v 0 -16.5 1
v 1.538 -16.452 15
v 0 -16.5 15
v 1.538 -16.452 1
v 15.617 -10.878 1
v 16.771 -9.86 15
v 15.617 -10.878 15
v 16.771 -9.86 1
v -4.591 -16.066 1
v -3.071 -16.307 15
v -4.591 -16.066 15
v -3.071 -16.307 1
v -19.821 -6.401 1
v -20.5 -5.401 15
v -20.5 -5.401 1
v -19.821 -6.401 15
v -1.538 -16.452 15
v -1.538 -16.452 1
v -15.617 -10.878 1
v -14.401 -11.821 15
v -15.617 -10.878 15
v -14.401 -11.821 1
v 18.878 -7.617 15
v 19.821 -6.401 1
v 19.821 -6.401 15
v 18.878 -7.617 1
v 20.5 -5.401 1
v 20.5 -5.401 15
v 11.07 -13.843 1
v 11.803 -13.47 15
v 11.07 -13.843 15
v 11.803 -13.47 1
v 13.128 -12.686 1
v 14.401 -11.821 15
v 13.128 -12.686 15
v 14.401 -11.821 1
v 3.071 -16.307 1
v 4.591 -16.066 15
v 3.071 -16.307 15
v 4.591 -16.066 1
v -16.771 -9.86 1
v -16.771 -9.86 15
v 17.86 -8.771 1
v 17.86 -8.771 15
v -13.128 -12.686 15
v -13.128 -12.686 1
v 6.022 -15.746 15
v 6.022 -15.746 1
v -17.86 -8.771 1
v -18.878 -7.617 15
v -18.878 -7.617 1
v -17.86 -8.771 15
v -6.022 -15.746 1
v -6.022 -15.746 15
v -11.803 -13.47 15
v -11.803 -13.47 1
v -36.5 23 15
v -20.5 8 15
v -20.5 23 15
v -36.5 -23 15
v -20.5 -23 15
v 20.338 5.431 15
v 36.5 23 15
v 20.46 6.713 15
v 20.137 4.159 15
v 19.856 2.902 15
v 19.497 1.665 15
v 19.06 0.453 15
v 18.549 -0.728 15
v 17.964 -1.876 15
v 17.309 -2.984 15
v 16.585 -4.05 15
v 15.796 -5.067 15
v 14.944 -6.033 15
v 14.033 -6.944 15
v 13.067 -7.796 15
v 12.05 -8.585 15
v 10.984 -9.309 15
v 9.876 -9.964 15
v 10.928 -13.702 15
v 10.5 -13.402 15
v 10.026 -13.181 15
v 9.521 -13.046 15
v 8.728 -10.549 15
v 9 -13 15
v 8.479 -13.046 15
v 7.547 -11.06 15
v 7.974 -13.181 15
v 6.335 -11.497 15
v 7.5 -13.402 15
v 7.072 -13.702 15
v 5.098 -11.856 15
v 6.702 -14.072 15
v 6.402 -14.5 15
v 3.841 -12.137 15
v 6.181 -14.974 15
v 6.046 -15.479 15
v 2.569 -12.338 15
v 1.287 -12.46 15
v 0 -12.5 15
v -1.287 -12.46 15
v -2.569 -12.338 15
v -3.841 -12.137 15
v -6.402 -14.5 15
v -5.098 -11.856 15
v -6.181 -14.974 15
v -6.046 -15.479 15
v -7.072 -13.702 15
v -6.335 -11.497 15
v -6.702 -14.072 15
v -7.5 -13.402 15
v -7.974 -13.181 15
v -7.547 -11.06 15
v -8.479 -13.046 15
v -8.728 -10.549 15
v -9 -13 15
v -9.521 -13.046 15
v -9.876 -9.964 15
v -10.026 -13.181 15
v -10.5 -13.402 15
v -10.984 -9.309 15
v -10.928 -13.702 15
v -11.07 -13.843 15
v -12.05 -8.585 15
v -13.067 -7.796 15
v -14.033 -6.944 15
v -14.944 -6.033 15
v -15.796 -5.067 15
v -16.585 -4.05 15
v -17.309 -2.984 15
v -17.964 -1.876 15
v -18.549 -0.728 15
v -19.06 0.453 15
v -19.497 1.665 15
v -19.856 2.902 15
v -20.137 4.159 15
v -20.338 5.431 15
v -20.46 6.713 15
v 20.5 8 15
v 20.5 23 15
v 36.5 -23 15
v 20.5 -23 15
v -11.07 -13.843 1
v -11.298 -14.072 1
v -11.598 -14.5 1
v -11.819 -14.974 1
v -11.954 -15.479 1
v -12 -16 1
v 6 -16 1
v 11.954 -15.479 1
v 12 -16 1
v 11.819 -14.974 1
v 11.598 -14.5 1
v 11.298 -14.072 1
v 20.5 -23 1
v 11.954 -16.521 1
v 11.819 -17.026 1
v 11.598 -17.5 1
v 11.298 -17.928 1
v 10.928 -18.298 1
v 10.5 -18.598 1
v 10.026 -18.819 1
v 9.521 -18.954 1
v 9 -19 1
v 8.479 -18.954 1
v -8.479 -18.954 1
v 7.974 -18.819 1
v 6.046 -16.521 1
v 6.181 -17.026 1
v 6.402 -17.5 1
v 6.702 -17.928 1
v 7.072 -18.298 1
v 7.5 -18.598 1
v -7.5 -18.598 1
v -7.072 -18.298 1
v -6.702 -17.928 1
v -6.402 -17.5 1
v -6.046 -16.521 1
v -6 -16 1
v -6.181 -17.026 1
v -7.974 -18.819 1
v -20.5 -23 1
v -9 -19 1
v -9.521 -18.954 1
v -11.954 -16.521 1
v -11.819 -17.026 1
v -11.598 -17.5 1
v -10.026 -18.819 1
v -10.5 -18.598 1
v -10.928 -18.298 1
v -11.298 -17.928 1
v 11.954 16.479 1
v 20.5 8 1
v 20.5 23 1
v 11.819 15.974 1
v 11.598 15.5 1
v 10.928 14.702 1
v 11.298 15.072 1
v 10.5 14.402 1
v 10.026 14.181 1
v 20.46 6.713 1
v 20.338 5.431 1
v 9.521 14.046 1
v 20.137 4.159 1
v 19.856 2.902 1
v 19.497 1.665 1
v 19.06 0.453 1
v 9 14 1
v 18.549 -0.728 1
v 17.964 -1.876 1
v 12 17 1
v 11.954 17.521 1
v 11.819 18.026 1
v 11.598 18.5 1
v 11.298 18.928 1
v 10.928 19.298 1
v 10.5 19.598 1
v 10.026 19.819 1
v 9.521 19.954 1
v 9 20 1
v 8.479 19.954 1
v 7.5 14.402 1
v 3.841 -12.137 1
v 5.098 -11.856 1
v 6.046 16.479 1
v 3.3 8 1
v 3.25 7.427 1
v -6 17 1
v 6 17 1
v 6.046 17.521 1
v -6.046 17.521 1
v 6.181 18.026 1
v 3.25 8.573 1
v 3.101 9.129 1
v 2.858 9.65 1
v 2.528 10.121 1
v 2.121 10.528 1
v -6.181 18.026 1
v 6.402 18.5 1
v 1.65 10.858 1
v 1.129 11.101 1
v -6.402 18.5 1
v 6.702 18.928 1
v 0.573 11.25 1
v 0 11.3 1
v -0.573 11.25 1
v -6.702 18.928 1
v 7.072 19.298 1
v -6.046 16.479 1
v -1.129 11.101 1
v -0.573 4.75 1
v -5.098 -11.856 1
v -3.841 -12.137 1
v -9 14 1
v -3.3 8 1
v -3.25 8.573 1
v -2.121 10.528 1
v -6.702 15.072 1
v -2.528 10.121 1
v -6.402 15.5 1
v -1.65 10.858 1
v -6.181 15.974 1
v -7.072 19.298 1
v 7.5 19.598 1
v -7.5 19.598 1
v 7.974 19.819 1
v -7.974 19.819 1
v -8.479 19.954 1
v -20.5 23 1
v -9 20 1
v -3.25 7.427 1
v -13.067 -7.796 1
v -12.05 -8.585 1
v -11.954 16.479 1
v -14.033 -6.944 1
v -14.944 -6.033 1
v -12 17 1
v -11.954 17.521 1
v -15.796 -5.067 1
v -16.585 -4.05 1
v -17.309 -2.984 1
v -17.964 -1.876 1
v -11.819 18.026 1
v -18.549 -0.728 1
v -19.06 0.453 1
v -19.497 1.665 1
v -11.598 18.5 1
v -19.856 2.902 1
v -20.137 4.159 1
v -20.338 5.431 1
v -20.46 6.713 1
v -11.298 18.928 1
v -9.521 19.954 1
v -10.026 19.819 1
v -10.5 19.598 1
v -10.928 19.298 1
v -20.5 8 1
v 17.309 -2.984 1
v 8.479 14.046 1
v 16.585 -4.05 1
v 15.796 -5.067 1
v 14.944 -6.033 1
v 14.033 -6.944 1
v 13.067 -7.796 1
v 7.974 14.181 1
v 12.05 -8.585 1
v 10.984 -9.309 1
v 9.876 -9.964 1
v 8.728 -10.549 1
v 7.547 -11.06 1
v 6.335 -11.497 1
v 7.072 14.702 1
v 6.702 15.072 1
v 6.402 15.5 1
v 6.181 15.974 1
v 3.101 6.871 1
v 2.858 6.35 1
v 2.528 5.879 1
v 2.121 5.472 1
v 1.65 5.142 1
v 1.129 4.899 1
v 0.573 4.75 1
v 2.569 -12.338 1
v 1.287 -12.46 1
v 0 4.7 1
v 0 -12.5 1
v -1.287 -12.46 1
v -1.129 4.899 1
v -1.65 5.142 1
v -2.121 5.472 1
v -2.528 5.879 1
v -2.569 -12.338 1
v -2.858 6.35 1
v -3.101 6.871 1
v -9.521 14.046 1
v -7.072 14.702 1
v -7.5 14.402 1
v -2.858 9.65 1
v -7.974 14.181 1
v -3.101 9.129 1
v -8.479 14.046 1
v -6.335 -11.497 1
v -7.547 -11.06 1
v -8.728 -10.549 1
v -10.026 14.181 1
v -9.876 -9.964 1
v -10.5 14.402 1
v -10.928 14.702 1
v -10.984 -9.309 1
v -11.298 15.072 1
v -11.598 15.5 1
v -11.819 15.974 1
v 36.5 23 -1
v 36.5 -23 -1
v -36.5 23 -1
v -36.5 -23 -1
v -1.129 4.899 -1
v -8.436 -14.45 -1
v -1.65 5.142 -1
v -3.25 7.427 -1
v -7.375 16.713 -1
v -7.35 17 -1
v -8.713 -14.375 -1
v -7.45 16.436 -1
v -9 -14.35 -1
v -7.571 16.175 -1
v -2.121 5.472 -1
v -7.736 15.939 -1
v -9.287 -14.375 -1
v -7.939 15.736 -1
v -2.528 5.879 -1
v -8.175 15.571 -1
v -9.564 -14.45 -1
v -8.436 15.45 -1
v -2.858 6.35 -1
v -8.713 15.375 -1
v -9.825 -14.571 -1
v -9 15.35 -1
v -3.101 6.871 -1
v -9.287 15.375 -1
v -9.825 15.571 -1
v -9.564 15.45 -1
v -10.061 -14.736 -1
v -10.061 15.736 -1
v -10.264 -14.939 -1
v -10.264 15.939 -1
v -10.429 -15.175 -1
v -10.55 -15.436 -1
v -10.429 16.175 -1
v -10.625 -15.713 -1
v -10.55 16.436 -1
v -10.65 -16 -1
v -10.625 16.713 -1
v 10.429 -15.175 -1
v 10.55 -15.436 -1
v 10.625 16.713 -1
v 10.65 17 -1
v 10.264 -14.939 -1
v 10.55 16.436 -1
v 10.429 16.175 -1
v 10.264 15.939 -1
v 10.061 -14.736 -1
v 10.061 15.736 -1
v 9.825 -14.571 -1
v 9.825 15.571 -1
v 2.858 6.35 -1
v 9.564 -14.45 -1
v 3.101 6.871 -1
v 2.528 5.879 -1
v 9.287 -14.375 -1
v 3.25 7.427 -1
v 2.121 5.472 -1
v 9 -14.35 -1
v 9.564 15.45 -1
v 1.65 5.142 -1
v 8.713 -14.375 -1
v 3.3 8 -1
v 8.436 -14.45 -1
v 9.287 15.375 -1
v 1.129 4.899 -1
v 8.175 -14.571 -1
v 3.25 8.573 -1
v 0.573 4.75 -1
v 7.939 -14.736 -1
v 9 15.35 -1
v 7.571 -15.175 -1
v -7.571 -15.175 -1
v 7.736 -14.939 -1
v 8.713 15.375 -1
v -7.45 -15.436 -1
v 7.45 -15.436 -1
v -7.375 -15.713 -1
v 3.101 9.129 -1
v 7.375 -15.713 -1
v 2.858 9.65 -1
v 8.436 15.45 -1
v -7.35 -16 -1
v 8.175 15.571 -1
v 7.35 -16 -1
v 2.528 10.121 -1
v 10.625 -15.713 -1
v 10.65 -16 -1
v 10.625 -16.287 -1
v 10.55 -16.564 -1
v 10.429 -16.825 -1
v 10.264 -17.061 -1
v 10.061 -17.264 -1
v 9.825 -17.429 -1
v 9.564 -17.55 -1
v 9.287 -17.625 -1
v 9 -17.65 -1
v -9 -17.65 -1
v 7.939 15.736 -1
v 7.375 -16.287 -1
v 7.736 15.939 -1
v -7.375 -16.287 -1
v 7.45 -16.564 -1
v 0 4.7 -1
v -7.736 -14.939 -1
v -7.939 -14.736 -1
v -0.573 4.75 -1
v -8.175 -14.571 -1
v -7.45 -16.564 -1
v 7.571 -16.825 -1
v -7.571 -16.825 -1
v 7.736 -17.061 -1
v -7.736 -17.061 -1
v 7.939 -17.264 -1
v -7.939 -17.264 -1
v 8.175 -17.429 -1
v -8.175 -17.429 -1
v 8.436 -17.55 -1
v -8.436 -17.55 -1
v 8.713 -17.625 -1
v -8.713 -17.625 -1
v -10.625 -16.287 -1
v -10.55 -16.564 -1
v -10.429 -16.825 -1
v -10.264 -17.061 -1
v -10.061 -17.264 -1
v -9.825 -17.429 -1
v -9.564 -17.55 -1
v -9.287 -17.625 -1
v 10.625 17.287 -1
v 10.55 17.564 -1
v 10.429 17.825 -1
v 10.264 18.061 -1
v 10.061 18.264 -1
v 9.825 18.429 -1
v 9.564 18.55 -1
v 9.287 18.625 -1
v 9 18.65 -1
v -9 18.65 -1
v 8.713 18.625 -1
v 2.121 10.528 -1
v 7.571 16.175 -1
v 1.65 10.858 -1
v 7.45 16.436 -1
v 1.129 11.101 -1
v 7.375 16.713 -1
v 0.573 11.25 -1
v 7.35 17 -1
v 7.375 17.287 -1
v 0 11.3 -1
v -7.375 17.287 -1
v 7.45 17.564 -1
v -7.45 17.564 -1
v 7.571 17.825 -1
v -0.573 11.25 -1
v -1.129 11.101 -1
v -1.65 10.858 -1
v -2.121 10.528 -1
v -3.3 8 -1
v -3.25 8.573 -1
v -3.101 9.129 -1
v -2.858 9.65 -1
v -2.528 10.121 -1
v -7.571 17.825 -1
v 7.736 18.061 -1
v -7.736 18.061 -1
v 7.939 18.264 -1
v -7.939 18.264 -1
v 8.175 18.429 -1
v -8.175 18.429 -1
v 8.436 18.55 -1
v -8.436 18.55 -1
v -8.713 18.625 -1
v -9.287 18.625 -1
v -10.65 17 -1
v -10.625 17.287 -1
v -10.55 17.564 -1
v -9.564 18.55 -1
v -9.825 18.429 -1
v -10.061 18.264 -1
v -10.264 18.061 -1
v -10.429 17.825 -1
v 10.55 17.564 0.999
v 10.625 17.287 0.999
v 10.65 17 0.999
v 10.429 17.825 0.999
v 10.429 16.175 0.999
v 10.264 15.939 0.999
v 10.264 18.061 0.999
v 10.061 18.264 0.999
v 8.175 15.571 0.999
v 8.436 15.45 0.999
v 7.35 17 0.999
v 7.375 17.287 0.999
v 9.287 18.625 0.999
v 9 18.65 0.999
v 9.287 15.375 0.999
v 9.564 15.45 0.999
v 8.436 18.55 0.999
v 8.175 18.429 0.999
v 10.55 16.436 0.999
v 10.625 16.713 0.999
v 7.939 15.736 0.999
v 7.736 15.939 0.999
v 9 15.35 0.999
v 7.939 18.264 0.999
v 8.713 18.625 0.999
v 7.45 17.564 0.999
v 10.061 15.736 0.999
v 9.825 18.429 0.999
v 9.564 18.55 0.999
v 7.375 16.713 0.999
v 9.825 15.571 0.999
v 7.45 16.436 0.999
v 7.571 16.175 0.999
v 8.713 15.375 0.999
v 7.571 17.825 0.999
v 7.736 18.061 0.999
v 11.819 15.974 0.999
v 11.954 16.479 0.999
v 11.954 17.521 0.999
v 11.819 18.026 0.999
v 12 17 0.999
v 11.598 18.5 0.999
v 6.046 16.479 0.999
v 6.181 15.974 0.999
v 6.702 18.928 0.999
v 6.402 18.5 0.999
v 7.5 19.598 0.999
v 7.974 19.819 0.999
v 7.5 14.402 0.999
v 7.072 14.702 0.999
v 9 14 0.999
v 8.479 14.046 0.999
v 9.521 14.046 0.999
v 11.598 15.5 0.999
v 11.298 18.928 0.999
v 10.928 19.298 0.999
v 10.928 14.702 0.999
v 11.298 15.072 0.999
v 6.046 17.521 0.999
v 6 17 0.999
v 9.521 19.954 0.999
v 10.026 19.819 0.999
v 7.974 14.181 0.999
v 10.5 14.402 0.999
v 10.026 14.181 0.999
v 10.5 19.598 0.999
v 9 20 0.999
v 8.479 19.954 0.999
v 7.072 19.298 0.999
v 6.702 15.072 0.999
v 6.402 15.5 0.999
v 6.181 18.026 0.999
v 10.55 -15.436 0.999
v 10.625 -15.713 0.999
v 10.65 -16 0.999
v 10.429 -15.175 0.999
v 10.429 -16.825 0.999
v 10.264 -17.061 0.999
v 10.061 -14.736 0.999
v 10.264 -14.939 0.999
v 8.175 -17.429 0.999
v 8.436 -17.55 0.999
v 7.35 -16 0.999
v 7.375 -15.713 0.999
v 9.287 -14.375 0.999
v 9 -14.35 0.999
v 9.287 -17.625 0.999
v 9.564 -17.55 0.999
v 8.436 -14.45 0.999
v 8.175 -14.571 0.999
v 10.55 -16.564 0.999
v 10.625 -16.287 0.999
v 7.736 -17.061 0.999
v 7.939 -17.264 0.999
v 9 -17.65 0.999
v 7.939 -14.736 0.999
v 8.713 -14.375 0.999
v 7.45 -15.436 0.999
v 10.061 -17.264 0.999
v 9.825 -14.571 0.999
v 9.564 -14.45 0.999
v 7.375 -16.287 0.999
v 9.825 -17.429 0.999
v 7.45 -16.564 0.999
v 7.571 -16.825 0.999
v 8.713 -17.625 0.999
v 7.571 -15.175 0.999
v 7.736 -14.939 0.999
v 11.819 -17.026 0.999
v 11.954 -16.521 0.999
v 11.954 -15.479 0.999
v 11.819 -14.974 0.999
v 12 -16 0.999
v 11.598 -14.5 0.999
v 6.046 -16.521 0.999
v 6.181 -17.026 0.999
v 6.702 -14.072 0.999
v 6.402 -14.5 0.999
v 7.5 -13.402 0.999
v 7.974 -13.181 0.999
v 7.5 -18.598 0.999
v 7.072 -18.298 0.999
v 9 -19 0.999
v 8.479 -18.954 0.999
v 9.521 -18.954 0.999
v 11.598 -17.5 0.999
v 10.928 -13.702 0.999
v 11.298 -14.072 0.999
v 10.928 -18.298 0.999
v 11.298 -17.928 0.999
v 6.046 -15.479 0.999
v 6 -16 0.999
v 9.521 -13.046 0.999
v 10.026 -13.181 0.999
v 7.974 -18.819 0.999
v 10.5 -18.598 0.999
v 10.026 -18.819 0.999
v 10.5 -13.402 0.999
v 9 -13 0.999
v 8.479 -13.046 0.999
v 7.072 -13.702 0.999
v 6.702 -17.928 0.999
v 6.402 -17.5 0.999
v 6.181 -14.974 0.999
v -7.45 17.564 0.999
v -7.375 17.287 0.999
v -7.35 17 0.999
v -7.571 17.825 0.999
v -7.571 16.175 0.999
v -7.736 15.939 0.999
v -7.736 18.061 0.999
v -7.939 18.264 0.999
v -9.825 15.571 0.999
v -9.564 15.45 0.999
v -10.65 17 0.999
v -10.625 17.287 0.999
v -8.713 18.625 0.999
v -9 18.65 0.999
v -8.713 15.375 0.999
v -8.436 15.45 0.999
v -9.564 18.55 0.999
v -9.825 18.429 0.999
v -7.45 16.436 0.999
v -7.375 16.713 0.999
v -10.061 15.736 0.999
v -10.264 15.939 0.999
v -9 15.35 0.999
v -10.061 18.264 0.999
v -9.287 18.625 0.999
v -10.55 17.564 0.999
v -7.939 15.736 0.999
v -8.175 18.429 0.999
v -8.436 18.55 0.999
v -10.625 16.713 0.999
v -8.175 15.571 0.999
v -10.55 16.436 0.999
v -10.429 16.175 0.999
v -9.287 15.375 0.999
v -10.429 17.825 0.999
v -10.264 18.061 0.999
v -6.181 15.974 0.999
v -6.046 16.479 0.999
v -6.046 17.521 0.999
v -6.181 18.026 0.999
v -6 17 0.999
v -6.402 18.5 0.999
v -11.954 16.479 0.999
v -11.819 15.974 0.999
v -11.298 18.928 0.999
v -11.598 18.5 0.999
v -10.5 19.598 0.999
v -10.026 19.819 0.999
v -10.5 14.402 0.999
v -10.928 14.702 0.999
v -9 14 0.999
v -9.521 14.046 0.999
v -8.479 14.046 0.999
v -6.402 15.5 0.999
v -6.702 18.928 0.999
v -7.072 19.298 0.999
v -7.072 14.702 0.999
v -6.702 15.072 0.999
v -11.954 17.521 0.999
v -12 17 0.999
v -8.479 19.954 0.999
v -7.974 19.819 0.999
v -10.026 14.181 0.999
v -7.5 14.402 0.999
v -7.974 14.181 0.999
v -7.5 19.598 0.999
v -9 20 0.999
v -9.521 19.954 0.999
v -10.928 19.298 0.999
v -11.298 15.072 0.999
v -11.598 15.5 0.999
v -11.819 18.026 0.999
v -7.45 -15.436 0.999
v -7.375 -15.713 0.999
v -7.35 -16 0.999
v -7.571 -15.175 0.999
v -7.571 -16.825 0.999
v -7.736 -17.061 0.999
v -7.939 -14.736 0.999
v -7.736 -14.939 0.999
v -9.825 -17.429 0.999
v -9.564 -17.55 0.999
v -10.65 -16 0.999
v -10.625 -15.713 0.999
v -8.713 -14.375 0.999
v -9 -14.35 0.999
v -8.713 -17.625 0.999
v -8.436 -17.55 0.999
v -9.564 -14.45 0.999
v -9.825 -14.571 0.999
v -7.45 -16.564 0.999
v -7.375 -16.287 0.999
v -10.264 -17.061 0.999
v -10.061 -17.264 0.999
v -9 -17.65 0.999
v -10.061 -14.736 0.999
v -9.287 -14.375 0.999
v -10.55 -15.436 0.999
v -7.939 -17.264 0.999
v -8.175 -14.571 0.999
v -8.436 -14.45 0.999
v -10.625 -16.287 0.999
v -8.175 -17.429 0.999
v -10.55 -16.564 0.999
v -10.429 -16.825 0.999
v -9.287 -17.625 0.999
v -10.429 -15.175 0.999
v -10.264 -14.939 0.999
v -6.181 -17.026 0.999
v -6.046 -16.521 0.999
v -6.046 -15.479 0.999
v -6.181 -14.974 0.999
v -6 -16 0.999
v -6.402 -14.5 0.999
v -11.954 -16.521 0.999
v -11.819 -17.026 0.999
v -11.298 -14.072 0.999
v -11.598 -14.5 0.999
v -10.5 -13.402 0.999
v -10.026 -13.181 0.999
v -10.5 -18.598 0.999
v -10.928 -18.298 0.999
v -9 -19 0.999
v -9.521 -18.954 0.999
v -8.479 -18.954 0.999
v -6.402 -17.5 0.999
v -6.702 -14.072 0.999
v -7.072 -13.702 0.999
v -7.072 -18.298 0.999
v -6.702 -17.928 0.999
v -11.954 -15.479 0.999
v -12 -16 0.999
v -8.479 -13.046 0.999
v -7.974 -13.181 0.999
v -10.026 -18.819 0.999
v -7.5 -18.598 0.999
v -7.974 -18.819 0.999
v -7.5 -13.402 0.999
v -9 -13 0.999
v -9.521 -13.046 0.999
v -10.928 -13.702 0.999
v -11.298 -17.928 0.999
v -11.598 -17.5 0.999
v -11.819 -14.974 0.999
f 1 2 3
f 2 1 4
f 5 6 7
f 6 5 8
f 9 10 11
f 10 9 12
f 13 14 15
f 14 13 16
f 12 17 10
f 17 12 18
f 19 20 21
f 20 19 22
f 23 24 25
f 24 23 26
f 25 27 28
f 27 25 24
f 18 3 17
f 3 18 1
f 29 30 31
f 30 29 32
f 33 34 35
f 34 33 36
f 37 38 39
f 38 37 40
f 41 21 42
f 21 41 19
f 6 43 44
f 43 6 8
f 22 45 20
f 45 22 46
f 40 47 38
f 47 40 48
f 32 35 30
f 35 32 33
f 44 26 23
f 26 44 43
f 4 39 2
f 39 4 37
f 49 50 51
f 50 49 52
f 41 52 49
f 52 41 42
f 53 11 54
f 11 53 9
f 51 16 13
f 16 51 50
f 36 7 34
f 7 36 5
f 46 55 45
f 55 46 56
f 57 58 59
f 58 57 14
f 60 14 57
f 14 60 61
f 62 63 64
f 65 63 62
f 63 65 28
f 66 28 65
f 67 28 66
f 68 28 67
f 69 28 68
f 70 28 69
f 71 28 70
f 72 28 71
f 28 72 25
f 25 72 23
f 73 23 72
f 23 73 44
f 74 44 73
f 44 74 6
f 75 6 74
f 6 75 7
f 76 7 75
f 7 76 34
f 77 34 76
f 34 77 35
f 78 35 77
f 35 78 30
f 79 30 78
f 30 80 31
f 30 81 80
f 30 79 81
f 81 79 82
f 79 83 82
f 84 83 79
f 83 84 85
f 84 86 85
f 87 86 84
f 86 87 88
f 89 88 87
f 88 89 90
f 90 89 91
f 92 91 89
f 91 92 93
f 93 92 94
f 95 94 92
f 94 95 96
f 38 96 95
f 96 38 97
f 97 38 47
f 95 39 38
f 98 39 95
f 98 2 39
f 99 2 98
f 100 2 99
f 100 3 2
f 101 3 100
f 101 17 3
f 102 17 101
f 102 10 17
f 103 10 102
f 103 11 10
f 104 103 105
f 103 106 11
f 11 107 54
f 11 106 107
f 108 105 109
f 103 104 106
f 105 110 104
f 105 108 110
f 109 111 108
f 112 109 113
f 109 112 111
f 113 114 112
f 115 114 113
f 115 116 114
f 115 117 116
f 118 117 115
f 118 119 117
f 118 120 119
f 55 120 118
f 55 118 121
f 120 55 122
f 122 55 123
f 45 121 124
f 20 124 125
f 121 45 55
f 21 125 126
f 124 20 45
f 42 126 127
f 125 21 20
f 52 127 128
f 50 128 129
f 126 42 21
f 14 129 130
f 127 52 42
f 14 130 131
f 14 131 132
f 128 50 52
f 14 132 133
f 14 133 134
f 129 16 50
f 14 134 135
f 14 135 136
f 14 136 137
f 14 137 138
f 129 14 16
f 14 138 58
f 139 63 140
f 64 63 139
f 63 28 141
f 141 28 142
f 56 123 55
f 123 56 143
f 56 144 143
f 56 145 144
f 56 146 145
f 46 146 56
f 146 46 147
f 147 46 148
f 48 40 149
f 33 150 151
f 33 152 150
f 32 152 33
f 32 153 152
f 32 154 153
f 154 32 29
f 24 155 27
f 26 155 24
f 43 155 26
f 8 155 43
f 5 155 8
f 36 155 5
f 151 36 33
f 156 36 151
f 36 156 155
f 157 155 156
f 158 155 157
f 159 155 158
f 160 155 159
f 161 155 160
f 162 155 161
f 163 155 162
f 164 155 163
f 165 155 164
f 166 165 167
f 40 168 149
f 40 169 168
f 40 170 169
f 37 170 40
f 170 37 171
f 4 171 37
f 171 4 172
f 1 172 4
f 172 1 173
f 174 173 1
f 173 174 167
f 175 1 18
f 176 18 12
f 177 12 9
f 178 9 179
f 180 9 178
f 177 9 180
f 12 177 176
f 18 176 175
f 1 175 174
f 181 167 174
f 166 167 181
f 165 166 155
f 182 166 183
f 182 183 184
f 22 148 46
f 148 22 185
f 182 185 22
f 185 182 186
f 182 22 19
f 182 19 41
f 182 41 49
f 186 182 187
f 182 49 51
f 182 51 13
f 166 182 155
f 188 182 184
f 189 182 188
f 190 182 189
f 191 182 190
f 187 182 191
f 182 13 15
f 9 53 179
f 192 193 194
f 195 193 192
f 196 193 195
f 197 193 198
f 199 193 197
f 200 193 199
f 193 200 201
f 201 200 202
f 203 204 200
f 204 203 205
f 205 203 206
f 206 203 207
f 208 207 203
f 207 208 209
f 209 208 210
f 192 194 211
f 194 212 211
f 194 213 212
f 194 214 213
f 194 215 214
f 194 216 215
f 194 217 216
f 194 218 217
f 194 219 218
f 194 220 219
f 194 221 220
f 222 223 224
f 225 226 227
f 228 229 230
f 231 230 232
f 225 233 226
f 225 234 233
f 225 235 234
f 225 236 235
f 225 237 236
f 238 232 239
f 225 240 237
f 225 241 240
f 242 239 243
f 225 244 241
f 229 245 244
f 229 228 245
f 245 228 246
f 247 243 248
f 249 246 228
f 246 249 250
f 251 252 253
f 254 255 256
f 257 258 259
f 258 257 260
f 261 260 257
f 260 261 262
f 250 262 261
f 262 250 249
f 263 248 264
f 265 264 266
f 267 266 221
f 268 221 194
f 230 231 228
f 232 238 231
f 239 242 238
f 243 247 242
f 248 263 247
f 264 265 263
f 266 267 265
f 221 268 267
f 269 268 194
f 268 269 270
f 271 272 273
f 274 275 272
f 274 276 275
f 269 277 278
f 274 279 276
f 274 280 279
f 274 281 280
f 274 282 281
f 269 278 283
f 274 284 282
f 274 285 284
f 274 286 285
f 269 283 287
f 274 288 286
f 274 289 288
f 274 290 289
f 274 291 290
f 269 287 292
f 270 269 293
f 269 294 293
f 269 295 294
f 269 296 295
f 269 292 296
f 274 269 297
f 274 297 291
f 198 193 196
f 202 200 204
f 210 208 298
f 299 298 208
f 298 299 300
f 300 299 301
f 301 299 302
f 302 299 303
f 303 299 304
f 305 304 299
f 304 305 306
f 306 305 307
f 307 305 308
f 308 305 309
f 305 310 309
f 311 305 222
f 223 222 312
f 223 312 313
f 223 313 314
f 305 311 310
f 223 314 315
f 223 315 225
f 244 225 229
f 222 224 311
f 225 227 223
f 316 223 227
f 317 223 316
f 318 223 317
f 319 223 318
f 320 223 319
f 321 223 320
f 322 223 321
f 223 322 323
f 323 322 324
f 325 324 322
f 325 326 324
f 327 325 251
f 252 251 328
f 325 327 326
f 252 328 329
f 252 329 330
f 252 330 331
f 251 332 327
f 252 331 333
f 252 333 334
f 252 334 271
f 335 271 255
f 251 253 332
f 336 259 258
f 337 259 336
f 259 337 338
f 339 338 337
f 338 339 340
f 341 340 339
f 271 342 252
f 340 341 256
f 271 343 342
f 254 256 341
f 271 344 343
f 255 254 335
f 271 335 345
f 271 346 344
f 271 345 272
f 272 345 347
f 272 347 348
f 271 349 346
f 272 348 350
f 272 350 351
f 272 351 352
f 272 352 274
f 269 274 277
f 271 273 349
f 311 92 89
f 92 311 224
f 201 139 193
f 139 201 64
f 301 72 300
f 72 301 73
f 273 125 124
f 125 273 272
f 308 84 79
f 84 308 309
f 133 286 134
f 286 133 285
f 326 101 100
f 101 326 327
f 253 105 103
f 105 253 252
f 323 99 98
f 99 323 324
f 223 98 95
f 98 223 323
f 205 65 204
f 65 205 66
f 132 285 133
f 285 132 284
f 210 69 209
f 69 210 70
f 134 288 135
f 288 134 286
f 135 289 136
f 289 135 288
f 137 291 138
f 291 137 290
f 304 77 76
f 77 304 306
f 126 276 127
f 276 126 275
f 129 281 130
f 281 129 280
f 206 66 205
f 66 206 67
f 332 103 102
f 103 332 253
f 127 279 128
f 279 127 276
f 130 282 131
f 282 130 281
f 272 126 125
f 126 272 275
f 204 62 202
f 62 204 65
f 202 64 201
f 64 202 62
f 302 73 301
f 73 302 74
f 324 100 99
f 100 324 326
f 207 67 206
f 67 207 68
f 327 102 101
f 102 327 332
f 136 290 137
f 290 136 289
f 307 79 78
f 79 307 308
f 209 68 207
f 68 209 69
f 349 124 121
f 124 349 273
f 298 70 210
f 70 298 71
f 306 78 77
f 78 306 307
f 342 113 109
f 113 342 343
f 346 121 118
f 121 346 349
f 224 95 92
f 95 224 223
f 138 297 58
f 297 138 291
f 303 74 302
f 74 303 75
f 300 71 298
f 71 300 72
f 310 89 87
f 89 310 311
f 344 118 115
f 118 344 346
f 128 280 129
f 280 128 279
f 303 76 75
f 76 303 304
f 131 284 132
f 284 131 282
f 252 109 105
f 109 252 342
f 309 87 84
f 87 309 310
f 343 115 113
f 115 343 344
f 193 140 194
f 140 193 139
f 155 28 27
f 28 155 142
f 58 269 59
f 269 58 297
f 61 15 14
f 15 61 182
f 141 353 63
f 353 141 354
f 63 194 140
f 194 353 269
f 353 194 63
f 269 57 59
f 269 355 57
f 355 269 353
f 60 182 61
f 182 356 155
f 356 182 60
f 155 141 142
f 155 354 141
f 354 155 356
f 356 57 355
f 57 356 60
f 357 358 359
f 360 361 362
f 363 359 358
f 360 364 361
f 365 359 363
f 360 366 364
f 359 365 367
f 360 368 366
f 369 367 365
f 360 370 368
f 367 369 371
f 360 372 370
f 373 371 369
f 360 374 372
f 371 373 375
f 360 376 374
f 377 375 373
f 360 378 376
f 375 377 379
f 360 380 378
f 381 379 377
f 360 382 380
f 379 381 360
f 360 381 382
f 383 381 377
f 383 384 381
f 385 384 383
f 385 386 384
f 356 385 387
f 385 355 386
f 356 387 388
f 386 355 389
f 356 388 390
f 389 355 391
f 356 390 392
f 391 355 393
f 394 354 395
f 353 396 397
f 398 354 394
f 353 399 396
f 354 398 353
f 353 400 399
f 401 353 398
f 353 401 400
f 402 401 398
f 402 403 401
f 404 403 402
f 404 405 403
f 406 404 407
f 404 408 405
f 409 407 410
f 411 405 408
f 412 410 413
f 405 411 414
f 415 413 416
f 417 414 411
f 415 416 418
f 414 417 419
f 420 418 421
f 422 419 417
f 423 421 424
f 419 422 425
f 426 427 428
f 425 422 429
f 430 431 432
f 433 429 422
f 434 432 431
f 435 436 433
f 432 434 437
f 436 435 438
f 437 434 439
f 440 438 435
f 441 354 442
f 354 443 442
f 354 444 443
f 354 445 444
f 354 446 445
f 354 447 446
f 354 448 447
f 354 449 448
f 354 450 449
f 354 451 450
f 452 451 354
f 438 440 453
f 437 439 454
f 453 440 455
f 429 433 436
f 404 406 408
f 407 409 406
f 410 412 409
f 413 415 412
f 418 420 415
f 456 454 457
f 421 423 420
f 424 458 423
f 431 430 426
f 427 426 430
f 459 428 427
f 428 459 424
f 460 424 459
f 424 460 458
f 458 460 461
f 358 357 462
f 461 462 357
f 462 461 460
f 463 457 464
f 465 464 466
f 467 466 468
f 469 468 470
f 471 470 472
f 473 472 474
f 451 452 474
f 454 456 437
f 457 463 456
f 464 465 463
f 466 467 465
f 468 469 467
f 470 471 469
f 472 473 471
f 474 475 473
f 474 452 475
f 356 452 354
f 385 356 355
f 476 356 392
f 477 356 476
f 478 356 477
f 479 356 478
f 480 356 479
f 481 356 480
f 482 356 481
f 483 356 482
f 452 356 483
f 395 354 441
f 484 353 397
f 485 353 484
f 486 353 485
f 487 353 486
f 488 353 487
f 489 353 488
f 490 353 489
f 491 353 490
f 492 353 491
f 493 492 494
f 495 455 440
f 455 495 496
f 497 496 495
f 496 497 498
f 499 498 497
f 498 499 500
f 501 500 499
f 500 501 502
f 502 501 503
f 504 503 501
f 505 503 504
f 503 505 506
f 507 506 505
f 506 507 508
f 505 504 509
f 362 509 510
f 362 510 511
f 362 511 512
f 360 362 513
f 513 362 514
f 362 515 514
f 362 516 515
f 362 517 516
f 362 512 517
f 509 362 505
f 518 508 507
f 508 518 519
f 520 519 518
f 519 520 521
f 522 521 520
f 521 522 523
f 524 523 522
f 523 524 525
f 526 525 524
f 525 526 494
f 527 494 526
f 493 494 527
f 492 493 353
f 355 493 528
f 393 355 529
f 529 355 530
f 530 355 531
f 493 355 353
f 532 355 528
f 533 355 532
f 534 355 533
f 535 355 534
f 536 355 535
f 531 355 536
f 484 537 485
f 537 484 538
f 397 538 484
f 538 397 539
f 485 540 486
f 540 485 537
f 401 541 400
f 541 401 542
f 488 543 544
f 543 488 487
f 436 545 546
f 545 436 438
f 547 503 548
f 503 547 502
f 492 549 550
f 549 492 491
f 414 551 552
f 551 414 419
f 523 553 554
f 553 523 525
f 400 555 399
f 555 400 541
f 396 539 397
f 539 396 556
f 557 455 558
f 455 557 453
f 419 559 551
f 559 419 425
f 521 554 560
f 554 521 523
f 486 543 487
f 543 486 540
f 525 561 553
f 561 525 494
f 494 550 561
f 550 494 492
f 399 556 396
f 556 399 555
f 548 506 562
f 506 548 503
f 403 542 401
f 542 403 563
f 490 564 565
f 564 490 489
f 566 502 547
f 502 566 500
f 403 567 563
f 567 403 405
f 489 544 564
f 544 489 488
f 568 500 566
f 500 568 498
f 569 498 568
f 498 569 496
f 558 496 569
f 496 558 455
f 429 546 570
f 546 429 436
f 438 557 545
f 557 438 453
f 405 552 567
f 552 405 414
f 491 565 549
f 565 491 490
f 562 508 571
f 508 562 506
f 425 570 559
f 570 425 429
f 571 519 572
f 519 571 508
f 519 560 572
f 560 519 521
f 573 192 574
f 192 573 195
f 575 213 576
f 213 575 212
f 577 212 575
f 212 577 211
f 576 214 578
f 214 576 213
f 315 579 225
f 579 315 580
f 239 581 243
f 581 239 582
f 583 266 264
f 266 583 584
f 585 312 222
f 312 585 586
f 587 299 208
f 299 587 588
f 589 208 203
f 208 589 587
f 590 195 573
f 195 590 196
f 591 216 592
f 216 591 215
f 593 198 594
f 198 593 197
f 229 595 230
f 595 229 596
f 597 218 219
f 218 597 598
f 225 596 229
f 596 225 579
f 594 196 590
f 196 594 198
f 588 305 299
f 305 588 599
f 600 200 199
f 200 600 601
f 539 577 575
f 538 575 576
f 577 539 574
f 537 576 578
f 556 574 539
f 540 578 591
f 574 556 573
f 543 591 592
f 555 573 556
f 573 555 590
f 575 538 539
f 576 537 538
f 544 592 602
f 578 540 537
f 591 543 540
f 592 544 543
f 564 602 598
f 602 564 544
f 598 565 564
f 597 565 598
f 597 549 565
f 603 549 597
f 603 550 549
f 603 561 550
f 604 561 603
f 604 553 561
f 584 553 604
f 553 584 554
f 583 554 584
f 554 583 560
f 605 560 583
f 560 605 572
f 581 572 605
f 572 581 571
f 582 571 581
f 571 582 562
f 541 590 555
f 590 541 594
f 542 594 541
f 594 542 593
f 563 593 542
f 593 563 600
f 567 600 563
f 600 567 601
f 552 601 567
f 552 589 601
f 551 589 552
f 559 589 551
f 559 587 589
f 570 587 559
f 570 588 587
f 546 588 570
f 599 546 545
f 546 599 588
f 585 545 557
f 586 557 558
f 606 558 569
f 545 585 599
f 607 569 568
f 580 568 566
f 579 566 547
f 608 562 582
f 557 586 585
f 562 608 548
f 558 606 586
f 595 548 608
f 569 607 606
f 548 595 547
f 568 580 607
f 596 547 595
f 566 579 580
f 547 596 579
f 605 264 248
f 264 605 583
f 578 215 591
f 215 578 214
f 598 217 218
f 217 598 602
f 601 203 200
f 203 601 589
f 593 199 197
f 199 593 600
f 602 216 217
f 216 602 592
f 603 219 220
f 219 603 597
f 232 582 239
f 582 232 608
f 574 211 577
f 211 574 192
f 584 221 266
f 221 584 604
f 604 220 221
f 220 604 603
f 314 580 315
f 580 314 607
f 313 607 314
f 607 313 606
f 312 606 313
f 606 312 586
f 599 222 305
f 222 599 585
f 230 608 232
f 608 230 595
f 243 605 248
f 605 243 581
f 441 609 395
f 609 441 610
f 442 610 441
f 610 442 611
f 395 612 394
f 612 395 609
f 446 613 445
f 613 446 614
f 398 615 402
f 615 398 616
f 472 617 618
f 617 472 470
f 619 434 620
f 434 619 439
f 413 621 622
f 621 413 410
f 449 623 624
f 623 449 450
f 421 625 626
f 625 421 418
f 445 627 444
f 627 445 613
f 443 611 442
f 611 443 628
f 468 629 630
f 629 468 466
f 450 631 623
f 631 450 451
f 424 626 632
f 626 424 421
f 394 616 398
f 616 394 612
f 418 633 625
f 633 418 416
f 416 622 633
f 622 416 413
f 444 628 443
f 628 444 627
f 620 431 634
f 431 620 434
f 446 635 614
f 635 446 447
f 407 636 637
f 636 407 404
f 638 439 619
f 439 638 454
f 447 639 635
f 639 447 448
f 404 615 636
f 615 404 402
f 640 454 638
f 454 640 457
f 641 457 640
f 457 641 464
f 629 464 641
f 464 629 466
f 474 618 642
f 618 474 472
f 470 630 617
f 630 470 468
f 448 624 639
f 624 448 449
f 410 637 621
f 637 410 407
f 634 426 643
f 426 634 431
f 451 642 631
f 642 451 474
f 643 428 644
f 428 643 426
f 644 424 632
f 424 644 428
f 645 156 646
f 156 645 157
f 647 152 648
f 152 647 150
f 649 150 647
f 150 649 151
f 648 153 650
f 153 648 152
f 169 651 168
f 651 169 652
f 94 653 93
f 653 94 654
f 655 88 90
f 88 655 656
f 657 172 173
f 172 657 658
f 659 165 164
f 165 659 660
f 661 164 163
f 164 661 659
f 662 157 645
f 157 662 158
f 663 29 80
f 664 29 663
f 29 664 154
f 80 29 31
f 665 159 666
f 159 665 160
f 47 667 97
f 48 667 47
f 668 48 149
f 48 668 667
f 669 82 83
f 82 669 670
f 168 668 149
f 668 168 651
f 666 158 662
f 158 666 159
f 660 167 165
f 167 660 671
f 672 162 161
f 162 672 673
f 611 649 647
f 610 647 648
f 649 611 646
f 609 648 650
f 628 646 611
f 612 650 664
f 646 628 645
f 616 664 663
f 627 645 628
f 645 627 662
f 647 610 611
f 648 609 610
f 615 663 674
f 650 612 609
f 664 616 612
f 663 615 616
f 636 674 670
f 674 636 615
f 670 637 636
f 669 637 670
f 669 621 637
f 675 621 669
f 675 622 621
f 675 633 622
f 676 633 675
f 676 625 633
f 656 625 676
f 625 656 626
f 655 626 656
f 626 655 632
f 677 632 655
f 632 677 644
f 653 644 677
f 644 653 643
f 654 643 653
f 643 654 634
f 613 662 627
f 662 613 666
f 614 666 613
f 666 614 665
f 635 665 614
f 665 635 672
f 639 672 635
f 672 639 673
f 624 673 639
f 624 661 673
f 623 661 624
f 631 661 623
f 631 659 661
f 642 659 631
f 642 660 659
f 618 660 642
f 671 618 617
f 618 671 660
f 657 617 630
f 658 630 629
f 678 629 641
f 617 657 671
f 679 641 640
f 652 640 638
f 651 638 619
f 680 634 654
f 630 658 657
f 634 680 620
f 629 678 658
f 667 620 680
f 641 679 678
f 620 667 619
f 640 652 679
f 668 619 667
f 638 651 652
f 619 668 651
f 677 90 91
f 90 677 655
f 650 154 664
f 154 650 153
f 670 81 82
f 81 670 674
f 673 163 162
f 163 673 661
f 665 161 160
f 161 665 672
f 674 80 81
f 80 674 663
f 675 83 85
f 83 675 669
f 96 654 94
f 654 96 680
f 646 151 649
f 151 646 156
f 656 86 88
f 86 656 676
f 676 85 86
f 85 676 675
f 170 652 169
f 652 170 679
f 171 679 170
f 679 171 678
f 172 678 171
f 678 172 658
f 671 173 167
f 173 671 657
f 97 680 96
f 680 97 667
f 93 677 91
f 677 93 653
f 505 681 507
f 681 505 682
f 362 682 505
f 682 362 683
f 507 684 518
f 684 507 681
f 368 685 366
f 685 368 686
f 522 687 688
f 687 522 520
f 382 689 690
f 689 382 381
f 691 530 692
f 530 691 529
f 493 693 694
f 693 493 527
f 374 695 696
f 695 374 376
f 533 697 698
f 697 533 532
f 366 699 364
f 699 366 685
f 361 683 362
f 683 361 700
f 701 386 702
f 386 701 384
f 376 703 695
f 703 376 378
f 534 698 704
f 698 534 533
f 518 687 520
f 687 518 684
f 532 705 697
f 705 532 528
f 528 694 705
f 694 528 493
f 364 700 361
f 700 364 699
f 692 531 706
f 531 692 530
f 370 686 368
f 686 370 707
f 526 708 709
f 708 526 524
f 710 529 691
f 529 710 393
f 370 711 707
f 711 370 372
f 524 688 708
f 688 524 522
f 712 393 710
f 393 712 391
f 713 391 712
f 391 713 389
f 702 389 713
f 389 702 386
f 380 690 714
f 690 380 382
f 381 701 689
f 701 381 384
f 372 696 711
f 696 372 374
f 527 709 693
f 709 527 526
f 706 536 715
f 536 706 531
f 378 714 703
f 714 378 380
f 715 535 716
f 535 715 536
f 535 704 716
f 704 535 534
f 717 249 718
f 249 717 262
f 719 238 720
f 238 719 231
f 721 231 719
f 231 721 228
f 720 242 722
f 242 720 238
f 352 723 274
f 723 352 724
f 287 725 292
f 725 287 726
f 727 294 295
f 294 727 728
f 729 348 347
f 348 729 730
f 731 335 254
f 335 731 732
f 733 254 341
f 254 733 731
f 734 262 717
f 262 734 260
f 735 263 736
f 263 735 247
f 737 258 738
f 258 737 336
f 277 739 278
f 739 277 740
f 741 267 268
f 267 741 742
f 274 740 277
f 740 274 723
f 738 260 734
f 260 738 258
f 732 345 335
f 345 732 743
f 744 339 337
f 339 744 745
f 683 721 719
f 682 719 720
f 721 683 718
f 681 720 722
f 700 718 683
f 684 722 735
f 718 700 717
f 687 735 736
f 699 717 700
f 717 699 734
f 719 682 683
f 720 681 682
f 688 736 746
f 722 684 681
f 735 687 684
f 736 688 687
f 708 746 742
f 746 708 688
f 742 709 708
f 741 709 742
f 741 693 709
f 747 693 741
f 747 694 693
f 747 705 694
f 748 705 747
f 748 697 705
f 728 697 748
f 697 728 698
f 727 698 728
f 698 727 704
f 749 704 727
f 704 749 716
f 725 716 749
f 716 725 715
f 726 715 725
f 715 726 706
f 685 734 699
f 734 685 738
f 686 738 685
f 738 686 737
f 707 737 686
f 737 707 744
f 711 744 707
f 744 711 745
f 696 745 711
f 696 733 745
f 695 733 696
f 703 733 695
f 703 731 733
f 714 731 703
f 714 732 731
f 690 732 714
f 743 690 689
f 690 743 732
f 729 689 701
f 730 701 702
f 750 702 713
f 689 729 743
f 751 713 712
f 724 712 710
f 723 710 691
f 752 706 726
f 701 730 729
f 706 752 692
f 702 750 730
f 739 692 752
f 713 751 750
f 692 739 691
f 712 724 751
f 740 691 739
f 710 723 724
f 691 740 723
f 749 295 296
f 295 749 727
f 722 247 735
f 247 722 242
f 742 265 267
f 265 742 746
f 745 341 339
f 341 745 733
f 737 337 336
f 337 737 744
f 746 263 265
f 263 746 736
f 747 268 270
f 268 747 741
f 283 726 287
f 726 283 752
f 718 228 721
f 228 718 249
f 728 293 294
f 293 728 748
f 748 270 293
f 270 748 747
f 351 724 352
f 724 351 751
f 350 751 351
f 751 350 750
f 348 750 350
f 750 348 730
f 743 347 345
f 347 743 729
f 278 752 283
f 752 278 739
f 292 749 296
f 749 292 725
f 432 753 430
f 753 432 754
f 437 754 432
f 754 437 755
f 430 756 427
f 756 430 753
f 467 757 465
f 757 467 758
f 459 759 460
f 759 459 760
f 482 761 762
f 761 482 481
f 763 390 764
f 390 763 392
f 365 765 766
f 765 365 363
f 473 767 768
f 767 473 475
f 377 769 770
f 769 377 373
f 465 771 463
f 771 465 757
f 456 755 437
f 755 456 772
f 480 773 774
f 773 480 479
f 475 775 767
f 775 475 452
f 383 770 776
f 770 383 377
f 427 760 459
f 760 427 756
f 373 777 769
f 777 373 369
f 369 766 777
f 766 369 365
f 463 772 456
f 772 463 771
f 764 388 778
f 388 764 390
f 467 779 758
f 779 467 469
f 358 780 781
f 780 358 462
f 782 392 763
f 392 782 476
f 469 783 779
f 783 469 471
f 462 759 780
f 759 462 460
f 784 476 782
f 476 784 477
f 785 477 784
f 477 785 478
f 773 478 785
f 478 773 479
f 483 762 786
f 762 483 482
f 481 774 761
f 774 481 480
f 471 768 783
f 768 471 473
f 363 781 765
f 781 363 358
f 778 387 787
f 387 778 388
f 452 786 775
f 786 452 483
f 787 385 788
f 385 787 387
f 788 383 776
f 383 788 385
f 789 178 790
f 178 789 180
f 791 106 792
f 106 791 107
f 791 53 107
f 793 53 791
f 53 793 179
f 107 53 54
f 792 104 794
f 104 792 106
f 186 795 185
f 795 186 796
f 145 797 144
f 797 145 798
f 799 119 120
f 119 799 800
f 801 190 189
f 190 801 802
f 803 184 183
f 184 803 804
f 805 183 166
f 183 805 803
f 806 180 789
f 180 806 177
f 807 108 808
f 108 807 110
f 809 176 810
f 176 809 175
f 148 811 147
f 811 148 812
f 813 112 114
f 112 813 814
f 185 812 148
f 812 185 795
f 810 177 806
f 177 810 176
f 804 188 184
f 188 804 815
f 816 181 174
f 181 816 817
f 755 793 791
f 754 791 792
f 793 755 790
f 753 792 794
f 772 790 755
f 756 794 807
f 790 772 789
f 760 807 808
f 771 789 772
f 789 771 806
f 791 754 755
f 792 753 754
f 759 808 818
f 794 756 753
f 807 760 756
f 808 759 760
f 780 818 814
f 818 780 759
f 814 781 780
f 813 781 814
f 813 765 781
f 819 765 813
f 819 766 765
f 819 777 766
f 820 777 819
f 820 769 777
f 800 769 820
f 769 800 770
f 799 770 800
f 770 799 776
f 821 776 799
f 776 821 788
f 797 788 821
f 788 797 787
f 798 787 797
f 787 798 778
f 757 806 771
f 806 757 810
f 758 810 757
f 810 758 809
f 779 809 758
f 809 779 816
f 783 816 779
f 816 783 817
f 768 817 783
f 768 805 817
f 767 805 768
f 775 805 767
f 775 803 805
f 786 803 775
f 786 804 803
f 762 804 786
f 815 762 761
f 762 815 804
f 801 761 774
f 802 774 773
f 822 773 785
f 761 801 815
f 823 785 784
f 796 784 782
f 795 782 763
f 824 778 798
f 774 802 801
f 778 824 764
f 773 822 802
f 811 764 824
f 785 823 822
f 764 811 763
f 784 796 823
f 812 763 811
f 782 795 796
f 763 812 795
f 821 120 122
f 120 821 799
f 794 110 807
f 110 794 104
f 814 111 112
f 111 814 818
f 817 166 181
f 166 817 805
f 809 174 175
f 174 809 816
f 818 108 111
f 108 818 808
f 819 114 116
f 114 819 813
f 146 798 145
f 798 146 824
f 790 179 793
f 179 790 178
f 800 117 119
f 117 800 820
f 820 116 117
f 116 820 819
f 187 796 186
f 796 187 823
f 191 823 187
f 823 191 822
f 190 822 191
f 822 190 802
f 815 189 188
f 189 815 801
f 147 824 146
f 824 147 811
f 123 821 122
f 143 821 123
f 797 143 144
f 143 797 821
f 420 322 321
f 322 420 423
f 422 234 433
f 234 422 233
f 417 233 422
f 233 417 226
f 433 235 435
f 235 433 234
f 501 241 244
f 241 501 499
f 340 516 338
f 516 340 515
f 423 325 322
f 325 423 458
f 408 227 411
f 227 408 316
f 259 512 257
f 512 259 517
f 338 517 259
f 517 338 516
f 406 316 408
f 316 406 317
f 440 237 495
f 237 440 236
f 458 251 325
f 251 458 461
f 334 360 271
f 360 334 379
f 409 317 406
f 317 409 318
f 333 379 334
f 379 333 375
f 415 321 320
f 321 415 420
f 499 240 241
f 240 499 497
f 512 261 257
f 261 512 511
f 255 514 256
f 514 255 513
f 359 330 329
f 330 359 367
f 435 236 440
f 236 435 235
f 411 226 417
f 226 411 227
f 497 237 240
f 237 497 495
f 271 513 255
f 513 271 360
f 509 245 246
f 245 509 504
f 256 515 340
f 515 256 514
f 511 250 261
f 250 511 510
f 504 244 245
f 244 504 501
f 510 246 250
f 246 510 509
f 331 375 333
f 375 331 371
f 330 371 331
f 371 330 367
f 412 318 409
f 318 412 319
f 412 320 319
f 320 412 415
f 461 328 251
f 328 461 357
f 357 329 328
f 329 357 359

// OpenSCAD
GEARBOX_WIDTH = 32;
GEARBOX_DEPTH = 46;
GEARBOX_HEIGHT = 25.2;

GEARBOX_GAP = 1;

SCREW_HOLE_HEIGHT = 2;
SCREW_HOLE_X_OFFSET = 9;
SCREW_HOLE_Y_OFFSET_TOP = 17;
SCREW_HOLE_Y_OFFSET_BOTTOM = 16;

CASE_WALL_THICKNESS = 2;
GAP_SIZE = 0.3;  // gap between motor and housing

SHAFT_Y_OFFSET = 8;
SHAFT_DIAMETER = 6;
SHAFT_LENGTH = 14;
SHAFT_CLEARANCE = 2;

M3_HOLE_DIAMETER = 3.3;
M3_SCREW_HEAD_DIAMETER = 6;

GRIP_DIAMETER = 41;
GRIP_GUIDE_WALL_THICKNESS = 4;
GRIP_GUIDE_DEPTH = 12;
GRIP_GUIDE_HEIGHT = SHAFT_LENGTH - CASE_WALL_THICKNESS + SHAFT_CLEARANCE;
GRIP_OD = GRIP_DIAMETER + GRIP_GUIDE_WALL_THICKNESS * 2;

COMMAND_STRIP_LENGTH = 46;
COMMAND_STRIP_WIDTH = 16;

module m3_cutout()
{
    cylinder(
        h=CASE_WALL_THICKNESS + 0.001,
        d=M3_HOLE_DIAMETER,
        center=true,
        $fn=36
    );
    translate([0, 0, CASE_WALL_THICKNESS / 2 + GRIP_GUIDE_HEIGHT / 2])
    {
        cylinder(
            h=GRIP_GUIDE_HEIGHT + 0.001,
            d=M3_SCREW_HEAD_DIAMETER,
            center=true,
            $fn=36
        );
    }
}

module feeder()
{
    union()
    {
        difference()
        {
            // ring
            cylinder(
                h=GRIP_GUIDE_HEIGHT,
                d=GRIP_OD,
                $fn=100,
                center=true
            );
            cylinder(h=GRIP_GUIDE_HEIGHT+0.001, d=GRIP_DIAMETER, $fn=100, center=true);

            // half-cylinder
            translate([0, GRIP_OD / 2, 0])
            {
                cube(GRIP_OD, center=true);
            }

        }

        // straight portion
        for (x=[1, -1])
        {
            translate(
                [
                    (GRIP_DIAMETER / 2 + GRIP_GUIDE_WALL_THICKNESS / 2) * x,
                    GRIP_GUIDE_DEPTH / 2,
                    0,
                ]
            )
            {
                cube(
                    [
                        GRIP_GUIDE_WALL_THICKNESS,
                        GRIP_GUIDE_DEPTH,
                        GRIP_GUIDE_HEIGHT
                    ],
                    center=true
                );
            }
        }
    }
}

difference()
{
    base_width = GRIP_DIAMETER + COMMAND_STRIP_WIDTH * 2;

    union()
    {
        cube(
            [
                base_width,
                GEARBOX_DEPTH,
                CASE_WALL_THICKNESS
            ],
            center=true
        );
        translate(
            [
                0,
                SHAFT_Y_OFFSET,
                CASE_WALL_THICKNESS / 2 + GRIP_GUIDE_HEIGHT / 2
            ]
        )
        {
            feeder();
        }

        for (x=[1, -1])
        {
            translate(
                [
                    x * ((GRIP_DIAMETER + COMMAND_STRIP_WIDTH) / 2),
                    0,
                    (CASE_WALL_THICKNESS + GRIP_GUIDE_HEIGHT) / 2,
                ]
            )
            {
                cube(
                    [COMMAND_STRIP_WIDTH, COMMAND_STRIP_LENGTH, GRIP_GUIDE_HEIGHT],
                    center=true
                );
            }
        }
    }
    translate([0, SHAFT_Y_OFFSET, 0])
    {
        cylinder(
            h=CASE_WALL_THICKNESS + 0.001,
            d=SHAFT_DIAMETER + GAP_SIZE * 2,
            center=true,
            $fn=36
        );
    }
    for (x=[1, -1])
    {
        translate([x*SCREW_HOLE_X_OFFSET, SCREW_HOLE_Y_OFFSET_TOP, 0])
        {
            m3_cutout();
        }
        translate([x*SCREW_HOLE_X_OFFSET, -SCREW_HOLE_Y_OFFSET_BOTTOM, 0])
        {
            m3_cutout();
        }
    }
}
